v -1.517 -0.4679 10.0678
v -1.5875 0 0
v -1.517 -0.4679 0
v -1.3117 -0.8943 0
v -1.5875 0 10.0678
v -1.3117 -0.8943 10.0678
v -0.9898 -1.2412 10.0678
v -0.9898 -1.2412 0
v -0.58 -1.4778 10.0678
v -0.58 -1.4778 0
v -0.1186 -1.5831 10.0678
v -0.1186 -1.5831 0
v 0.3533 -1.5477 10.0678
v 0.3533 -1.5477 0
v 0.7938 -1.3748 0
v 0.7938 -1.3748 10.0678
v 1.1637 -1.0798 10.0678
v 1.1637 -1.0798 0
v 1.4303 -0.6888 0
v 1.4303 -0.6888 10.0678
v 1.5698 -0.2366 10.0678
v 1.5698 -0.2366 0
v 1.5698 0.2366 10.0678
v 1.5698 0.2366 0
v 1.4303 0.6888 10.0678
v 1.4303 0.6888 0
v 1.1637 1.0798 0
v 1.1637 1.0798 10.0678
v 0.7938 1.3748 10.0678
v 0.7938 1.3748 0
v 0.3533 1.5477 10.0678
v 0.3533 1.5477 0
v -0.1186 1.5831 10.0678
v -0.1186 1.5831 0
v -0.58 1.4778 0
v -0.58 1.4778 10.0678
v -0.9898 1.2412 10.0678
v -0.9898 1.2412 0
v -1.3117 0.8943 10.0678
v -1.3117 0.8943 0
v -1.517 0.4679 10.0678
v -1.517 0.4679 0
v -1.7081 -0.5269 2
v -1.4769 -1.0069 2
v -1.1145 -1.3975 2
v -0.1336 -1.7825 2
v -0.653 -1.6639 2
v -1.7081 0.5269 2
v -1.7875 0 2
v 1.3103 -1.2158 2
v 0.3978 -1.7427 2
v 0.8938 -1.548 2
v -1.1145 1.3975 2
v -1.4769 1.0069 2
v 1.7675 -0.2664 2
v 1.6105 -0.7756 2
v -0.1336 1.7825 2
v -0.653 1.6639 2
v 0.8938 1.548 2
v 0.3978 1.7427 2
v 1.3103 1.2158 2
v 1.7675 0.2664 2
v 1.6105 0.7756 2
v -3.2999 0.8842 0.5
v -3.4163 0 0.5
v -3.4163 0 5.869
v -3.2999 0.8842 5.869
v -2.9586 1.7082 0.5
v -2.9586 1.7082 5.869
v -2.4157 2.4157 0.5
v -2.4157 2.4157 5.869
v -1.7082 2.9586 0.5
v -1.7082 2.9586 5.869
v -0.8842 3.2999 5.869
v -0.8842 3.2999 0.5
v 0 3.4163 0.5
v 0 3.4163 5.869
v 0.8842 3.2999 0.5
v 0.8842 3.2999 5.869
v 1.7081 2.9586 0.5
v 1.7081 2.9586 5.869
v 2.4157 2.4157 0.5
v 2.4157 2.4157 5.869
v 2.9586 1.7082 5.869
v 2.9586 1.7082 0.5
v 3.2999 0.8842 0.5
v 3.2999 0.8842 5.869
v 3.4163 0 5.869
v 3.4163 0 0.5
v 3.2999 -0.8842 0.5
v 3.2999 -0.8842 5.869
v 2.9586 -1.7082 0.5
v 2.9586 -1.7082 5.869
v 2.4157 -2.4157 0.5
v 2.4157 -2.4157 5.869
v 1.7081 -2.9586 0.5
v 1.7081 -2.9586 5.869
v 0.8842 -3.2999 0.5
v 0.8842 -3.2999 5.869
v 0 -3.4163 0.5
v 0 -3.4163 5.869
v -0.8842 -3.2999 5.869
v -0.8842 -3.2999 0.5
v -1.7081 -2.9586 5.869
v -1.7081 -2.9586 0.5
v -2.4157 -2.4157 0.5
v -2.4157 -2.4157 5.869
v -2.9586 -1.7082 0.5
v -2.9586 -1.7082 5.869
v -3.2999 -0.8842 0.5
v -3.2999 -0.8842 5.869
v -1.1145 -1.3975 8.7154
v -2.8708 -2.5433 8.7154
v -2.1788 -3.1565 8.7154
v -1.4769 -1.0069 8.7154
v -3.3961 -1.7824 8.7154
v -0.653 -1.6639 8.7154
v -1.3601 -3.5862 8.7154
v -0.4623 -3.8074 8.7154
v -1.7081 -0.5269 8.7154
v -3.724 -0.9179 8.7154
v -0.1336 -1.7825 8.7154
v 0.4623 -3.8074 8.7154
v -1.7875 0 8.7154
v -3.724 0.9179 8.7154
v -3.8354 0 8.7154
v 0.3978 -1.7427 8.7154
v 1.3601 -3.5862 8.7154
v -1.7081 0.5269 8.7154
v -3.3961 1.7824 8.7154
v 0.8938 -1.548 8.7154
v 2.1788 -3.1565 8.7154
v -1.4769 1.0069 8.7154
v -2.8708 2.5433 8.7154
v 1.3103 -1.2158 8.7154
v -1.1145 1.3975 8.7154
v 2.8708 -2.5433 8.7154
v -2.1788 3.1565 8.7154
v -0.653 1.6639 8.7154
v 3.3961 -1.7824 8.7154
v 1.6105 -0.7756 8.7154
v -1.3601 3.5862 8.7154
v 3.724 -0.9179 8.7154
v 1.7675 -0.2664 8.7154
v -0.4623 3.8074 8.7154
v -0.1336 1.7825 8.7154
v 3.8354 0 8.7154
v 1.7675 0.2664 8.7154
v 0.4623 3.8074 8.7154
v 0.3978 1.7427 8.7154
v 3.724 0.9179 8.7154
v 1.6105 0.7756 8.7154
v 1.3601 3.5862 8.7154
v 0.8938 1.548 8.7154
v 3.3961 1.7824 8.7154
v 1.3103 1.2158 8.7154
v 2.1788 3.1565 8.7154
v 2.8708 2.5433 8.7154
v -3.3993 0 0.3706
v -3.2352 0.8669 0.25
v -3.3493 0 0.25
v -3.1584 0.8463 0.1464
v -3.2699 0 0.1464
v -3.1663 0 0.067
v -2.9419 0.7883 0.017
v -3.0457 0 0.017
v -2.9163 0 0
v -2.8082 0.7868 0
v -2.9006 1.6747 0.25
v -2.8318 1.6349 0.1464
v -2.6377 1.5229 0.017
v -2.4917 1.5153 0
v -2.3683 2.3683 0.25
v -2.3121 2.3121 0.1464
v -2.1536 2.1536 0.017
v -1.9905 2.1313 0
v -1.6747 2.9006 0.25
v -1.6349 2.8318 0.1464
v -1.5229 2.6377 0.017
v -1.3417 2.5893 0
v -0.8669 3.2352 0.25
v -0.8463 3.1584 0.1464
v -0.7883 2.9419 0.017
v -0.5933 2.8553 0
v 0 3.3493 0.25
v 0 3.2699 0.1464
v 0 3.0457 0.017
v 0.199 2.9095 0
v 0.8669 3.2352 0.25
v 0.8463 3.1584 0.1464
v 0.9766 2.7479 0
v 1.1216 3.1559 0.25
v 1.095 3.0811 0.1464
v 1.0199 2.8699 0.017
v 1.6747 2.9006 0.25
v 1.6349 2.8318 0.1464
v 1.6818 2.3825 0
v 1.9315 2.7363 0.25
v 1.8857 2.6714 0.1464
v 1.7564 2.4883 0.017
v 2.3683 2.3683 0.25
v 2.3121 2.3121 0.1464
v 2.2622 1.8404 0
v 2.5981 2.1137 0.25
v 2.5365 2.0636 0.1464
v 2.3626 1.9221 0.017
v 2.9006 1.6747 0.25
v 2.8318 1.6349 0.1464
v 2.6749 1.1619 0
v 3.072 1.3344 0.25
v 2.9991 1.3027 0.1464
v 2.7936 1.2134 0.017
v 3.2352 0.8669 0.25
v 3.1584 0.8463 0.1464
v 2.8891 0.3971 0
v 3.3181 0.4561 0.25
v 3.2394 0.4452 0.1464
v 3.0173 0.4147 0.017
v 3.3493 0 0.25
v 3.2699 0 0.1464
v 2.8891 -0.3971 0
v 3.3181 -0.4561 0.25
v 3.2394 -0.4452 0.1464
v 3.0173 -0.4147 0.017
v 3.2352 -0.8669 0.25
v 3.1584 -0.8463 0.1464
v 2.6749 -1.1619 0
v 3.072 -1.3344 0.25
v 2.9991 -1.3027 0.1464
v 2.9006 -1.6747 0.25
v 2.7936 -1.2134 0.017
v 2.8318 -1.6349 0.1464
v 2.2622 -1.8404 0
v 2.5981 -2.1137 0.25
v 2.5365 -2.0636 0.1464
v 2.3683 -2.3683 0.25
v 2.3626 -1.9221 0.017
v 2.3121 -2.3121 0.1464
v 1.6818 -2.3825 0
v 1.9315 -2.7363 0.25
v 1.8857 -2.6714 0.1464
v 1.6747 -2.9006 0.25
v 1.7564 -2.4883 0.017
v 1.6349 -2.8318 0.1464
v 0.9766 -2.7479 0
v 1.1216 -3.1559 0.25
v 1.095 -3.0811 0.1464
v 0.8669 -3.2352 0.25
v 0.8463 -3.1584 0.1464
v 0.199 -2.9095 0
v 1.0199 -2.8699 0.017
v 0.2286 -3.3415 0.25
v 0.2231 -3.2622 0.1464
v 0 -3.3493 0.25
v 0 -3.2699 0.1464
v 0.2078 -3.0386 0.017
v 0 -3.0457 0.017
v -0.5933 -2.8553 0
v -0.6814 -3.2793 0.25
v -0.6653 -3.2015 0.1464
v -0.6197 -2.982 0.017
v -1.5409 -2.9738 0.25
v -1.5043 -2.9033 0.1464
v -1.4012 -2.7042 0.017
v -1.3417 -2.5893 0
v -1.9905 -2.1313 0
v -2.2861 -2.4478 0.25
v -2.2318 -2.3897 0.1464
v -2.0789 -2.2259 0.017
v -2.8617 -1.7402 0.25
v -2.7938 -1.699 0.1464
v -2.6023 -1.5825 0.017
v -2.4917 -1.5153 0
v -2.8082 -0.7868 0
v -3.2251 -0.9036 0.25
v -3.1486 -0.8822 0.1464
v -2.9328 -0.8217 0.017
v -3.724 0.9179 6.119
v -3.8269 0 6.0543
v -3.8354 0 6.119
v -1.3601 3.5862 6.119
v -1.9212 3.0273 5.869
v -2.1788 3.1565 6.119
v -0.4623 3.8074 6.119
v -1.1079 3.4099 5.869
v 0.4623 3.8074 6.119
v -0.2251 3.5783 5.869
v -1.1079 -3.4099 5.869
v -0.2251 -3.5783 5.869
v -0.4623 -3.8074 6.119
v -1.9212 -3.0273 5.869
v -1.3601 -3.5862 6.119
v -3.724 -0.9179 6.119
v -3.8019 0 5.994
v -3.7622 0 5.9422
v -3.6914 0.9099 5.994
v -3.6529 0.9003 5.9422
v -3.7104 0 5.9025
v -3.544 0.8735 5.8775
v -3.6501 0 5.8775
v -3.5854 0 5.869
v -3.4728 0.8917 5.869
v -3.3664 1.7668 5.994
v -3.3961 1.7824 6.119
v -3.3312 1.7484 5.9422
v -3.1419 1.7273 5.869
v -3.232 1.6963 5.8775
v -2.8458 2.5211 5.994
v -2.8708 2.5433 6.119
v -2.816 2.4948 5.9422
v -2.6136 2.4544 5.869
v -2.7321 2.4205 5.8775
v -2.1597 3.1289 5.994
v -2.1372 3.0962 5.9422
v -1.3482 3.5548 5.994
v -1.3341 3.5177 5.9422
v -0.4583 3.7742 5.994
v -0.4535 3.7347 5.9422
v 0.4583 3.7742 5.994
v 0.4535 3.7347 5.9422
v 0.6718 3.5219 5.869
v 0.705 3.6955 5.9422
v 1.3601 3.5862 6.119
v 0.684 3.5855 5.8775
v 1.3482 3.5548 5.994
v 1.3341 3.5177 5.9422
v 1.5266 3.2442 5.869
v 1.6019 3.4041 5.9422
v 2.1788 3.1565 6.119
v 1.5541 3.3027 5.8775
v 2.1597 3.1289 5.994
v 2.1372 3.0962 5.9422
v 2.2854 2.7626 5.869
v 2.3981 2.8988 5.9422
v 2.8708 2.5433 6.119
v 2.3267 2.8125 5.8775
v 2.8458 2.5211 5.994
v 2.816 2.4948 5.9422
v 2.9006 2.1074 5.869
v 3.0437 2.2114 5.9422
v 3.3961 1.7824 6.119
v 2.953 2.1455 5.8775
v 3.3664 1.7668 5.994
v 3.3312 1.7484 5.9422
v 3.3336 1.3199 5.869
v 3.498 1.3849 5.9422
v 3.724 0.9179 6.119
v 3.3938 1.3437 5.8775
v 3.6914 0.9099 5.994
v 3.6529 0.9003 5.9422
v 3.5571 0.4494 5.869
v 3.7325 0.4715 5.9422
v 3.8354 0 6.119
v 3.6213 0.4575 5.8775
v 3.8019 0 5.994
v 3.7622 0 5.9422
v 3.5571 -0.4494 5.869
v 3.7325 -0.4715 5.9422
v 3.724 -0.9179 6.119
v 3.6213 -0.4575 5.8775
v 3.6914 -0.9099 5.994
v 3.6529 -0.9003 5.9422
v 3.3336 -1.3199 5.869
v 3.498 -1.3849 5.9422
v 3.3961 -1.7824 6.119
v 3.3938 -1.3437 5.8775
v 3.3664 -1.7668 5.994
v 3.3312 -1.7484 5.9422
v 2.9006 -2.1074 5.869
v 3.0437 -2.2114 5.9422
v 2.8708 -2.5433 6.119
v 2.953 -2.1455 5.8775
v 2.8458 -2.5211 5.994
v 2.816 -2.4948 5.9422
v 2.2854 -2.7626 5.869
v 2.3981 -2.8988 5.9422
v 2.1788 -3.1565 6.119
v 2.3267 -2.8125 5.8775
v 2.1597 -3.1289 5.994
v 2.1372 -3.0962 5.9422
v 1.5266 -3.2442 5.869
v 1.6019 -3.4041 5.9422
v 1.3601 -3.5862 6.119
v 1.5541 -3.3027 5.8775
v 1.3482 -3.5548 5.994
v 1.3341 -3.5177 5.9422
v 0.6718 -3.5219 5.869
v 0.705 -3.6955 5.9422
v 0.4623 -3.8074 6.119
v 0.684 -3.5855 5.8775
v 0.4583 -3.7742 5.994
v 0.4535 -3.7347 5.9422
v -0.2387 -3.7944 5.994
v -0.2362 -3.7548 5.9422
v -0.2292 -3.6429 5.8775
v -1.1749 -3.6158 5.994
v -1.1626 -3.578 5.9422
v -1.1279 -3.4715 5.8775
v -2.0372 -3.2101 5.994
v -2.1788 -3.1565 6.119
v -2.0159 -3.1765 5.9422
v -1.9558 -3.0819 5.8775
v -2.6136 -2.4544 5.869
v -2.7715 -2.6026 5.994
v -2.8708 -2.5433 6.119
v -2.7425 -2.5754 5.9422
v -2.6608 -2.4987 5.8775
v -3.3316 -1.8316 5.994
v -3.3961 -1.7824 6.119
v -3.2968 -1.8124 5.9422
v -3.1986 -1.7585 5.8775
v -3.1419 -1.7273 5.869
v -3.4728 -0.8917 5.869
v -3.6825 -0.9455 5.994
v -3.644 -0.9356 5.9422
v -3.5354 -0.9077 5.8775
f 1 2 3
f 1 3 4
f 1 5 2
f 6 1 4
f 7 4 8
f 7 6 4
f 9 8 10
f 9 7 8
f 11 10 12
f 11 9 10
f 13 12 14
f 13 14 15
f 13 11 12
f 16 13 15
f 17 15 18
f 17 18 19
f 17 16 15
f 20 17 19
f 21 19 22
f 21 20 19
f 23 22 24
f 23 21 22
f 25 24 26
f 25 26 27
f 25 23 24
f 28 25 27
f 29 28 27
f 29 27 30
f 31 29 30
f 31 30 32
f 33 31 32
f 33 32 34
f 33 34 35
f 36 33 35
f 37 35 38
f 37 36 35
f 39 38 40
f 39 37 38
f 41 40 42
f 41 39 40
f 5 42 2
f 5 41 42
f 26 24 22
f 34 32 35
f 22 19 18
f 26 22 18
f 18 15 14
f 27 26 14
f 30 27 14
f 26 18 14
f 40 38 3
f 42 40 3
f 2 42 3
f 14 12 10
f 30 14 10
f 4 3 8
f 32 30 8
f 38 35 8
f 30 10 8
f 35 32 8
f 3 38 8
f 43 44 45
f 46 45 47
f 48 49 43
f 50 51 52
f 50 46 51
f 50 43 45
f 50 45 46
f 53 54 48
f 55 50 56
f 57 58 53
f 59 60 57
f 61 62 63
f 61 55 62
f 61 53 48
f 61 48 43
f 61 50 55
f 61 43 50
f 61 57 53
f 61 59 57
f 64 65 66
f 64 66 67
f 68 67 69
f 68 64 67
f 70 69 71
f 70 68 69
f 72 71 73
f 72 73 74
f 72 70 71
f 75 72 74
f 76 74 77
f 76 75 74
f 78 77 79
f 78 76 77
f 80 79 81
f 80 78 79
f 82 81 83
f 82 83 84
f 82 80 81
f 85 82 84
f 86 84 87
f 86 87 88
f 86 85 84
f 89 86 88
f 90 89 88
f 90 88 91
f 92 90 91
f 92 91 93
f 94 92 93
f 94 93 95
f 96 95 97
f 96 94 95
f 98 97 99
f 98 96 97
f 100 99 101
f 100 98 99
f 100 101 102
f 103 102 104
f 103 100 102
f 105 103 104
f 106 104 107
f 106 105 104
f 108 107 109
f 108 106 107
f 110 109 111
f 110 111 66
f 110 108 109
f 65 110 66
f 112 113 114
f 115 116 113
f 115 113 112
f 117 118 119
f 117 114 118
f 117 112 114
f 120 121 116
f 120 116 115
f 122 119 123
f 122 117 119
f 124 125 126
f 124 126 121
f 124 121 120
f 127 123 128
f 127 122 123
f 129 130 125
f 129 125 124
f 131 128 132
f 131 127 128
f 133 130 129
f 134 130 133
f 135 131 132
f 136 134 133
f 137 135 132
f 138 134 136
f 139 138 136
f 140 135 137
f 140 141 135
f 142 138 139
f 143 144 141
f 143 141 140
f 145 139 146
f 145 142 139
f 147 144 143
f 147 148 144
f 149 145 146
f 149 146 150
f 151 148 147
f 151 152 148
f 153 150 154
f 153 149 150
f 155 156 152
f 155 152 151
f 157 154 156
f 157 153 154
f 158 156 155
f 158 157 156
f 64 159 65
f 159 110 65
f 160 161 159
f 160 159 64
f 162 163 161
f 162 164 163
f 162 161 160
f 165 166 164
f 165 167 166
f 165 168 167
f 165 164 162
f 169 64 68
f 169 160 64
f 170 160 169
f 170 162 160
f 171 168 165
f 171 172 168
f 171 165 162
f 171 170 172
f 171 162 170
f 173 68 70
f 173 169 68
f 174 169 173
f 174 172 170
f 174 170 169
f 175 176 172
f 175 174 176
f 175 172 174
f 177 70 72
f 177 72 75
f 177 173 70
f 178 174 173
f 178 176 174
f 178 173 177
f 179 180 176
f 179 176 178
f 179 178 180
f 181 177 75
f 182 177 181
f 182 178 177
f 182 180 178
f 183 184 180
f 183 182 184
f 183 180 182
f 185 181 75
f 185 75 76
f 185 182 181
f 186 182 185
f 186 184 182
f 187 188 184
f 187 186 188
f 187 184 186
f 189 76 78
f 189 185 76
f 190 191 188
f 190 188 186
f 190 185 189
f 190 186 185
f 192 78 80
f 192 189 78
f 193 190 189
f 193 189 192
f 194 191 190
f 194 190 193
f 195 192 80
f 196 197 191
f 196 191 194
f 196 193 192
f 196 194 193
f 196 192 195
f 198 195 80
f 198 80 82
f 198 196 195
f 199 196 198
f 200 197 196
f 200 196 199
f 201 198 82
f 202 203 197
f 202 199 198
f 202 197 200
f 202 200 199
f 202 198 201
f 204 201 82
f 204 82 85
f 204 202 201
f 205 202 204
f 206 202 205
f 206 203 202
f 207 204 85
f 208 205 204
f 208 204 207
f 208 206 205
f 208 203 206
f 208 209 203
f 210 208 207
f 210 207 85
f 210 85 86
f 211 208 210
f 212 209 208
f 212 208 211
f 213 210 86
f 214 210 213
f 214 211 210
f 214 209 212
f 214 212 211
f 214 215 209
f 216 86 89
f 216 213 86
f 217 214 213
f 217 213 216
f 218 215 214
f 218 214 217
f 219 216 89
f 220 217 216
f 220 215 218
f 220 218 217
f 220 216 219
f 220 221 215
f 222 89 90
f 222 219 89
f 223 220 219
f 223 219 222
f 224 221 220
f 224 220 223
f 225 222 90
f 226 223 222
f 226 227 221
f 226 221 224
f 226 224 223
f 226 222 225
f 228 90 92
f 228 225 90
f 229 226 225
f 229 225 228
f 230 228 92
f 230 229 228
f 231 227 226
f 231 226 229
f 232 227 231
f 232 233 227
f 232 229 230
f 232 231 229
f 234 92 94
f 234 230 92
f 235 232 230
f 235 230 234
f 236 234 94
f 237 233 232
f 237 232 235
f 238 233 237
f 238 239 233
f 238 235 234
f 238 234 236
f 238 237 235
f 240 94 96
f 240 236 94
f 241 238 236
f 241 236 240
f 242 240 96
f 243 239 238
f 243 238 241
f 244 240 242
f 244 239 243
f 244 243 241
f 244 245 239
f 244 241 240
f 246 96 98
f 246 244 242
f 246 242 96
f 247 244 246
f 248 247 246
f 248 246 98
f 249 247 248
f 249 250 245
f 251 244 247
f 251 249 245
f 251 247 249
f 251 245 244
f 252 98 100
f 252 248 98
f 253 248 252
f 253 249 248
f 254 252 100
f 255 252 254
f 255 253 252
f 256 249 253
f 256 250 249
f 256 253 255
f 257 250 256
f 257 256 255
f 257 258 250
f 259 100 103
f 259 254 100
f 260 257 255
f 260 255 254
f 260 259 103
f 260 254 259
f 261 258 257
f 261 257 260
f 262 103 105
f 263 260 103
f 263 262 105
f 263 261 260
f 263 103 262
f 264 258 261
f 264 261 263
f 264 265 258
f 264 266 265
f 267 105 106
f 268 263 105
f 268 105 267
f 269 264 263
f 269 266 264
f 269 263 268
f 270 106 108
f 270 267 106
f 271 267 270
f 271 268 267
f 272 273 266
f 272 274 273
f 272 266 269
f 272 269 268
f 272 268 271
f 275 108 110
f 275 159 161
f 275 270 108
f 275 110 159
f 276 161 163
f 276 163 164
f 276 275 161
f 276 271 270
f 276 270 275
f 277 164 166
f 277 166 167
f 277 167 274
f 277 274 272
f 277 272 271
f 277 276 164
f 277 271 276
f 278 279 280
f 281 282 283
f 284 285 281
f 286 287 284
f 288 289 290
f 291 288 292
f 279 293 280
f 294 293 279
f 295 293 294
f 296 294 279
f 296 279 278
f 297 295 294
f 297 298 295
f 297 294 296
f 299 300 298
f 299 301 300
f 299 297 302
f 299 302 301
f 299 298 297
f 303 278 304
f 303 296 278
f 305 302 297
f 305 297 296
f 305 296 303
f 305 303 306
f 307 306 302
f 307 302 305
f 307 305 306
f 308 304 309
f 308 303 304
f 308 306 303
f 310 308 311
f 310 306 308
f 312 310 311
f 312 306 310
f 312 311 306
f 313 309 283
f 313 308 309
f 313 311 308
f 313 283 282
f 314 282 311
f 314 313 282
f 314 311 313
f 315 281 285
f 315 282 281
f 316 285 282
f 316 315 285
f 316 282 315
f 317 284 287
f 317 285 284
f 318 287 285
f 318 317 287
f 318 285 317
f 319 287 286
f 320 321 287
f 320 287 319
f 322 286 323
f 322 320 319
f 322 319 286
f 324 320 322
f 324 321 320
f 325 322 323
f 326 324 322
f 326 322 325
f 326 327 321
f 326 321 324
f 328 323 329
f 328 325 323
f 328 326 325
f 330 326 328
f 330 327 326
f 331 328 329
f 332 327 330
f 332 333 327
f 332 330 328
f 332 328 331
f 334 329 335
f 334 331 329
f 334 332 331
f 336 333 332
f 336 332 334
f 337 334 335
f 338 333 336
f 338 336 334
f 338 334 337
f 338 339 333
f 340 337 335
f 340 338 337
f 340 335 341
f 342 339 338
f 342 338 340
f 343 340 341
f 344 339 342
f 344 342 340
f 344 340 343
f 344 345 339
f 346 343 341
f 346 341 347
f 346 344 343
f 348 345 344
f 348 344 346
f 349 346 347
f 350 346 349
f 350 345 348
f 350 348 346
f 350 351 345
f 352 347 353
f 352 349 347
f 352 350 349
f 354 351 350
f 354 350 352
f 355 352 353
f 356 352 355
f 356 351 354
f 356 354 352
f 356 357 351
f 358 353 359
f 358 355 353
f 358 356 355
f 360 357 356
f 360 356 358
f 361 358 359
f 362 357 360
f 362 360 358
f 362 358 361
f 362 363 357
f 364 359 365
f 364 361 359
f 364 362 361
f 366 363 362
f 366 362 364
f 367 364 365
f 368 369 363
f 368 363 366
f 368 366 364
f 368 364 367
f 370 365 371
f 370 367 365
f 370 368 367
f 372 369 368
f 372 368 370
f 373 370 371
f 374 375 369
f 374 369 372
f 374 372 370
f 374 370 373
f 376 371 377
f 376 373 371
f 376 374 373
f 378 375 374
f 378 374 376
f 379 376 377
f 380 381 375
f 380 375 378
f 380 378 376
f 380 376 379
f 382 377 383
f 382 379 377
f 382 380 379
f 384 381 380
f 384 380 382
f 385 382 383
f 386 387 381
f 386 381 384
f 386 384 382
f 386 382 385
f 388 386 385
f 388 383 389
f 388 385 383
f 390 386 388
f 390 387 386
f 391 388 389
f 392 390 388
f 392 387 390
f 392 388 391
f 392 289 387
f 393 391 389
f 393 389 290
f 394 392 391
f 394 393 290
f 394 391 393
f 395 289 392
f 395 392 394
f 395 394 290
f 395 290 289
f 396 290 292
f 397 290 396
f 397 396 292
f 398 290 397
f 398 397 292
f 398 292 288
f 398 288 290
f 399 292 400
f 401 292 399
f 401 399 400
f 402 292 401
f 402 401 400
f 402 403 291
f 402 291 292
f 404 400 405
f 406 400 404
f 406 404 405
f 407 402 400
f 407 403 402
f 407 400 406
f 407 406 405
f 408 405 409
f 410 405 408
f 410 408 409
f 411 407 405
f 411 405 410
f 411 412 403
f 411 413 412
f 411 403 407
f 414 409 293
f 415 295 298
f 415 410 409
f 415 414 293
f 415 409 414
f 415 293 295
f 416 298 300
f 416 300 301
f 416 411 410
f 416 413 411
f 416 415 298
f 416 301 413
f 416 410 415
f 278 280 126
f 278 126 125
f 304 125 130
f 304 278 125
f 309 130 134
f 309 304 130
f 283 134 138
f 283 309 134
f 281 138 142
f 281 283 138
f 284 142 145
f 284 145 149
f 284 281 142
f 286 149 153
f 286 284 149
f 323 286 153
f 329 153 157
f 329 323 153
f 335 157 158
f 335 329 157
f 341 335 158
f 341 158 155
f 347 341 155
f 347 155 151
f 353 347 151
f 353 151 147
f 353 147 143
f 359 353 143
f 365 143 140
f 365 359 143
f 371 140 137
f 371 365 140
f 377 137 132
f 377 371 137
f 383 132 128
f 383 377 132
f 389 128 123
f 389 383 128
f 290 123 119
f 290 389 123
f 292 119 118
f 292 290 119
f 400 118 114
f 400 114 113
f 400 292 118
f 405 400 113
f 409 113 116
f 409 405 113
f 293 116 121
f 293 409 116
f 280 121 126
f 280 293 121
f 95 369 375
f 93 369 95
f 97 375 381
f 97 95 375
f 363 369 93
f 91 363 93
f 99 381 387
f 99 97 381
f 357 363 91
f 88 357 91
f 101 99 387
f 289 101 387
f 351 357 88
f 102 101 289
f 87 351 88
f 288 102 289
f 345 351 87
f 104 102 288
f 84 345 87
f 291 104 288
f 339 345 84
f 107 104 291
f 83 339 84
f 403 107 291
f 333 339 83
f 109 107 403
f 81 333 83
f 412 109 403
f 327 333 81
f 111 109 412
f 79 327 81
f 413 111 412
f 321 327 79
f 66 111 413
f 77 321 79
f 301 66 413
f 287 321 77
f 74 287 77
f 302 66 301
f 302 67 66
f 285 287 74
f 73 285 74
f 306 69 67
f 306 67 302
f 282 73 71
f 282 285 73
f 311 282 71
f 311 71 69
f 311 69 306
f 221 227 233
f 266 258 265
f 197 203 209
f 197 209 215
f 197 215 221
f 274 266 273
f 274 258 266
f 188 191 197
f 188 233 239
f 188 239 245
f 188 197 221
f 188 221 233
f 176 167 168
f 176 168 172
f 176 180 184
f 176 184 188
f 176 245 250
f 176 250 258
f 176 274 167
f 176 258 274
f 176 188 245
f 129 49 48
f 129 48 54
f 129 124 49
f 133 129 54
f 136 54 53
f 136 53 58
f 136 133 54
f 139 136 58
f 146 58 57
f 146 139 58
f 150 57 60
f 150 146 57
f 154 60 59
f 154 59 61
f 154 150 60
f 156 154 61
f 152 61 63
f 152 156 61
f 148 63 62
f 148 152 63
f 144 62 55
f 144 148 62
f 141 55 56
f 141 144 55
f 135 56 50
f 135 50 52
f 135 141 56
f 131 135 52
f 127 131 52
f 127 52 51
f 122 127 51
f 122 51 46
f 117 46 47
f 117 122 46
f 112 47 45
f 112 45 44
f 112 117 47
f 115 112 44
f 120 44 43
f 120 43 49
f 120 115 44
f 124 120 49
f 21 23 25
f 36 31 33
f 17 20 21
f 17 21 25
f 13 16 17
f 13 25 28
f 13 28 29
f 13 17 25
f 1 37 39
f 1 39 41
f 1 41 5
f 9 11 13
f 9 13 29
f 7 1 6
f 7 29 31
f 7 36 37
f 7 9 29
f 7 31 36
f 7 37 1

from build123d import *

# Parameters (mm, degrees)
F2_R = 0.25
F3_R = 0.5
F4_W = 1.5875
F4_H = 10.0678


with BuildPart() as f1:
    # F0 (on Front) → F1 (revolve)
    with BuildSketch(Plane.XZ):
        Polygon((-3.4163, 0), (0, 0), (0, 2), (-1.7875, 2), (-1.7875, 8.7154), (-3.8354, 8.7154), (-3.8354, 5.869), (-3.4163, 5.869), align=None)
    revolve(axis=Axis((0, 0, 1), (0, 0, -1)))

    # F2
    f2_edges = [f1.edges().sort_by_distance(p)[0] for p in [
        (3.8354, 0, 5.869),
    ]]
    fillet(f2_edges, radius=F2_R)

    # F3
    f3_edges = [f1.edges().sort_by_distance(p)[0] for p in [
        (3.4163, 0, 0),
    ]]
    fillet(f3_edges, radius=F3_R)


with BuildPart() as f5:
    # F4 (on Front) → F5 (revolve)
    with BuildSketch(Plane.XZ):
        with Locations((-0.79375, 5.0339)):
            Rectangle(F4_W, F4_H)
    revolve(axis=Axis((0, 0, 5.0339), (0, 0, 1)))


solid = Compound([f1.part, f5.part])
